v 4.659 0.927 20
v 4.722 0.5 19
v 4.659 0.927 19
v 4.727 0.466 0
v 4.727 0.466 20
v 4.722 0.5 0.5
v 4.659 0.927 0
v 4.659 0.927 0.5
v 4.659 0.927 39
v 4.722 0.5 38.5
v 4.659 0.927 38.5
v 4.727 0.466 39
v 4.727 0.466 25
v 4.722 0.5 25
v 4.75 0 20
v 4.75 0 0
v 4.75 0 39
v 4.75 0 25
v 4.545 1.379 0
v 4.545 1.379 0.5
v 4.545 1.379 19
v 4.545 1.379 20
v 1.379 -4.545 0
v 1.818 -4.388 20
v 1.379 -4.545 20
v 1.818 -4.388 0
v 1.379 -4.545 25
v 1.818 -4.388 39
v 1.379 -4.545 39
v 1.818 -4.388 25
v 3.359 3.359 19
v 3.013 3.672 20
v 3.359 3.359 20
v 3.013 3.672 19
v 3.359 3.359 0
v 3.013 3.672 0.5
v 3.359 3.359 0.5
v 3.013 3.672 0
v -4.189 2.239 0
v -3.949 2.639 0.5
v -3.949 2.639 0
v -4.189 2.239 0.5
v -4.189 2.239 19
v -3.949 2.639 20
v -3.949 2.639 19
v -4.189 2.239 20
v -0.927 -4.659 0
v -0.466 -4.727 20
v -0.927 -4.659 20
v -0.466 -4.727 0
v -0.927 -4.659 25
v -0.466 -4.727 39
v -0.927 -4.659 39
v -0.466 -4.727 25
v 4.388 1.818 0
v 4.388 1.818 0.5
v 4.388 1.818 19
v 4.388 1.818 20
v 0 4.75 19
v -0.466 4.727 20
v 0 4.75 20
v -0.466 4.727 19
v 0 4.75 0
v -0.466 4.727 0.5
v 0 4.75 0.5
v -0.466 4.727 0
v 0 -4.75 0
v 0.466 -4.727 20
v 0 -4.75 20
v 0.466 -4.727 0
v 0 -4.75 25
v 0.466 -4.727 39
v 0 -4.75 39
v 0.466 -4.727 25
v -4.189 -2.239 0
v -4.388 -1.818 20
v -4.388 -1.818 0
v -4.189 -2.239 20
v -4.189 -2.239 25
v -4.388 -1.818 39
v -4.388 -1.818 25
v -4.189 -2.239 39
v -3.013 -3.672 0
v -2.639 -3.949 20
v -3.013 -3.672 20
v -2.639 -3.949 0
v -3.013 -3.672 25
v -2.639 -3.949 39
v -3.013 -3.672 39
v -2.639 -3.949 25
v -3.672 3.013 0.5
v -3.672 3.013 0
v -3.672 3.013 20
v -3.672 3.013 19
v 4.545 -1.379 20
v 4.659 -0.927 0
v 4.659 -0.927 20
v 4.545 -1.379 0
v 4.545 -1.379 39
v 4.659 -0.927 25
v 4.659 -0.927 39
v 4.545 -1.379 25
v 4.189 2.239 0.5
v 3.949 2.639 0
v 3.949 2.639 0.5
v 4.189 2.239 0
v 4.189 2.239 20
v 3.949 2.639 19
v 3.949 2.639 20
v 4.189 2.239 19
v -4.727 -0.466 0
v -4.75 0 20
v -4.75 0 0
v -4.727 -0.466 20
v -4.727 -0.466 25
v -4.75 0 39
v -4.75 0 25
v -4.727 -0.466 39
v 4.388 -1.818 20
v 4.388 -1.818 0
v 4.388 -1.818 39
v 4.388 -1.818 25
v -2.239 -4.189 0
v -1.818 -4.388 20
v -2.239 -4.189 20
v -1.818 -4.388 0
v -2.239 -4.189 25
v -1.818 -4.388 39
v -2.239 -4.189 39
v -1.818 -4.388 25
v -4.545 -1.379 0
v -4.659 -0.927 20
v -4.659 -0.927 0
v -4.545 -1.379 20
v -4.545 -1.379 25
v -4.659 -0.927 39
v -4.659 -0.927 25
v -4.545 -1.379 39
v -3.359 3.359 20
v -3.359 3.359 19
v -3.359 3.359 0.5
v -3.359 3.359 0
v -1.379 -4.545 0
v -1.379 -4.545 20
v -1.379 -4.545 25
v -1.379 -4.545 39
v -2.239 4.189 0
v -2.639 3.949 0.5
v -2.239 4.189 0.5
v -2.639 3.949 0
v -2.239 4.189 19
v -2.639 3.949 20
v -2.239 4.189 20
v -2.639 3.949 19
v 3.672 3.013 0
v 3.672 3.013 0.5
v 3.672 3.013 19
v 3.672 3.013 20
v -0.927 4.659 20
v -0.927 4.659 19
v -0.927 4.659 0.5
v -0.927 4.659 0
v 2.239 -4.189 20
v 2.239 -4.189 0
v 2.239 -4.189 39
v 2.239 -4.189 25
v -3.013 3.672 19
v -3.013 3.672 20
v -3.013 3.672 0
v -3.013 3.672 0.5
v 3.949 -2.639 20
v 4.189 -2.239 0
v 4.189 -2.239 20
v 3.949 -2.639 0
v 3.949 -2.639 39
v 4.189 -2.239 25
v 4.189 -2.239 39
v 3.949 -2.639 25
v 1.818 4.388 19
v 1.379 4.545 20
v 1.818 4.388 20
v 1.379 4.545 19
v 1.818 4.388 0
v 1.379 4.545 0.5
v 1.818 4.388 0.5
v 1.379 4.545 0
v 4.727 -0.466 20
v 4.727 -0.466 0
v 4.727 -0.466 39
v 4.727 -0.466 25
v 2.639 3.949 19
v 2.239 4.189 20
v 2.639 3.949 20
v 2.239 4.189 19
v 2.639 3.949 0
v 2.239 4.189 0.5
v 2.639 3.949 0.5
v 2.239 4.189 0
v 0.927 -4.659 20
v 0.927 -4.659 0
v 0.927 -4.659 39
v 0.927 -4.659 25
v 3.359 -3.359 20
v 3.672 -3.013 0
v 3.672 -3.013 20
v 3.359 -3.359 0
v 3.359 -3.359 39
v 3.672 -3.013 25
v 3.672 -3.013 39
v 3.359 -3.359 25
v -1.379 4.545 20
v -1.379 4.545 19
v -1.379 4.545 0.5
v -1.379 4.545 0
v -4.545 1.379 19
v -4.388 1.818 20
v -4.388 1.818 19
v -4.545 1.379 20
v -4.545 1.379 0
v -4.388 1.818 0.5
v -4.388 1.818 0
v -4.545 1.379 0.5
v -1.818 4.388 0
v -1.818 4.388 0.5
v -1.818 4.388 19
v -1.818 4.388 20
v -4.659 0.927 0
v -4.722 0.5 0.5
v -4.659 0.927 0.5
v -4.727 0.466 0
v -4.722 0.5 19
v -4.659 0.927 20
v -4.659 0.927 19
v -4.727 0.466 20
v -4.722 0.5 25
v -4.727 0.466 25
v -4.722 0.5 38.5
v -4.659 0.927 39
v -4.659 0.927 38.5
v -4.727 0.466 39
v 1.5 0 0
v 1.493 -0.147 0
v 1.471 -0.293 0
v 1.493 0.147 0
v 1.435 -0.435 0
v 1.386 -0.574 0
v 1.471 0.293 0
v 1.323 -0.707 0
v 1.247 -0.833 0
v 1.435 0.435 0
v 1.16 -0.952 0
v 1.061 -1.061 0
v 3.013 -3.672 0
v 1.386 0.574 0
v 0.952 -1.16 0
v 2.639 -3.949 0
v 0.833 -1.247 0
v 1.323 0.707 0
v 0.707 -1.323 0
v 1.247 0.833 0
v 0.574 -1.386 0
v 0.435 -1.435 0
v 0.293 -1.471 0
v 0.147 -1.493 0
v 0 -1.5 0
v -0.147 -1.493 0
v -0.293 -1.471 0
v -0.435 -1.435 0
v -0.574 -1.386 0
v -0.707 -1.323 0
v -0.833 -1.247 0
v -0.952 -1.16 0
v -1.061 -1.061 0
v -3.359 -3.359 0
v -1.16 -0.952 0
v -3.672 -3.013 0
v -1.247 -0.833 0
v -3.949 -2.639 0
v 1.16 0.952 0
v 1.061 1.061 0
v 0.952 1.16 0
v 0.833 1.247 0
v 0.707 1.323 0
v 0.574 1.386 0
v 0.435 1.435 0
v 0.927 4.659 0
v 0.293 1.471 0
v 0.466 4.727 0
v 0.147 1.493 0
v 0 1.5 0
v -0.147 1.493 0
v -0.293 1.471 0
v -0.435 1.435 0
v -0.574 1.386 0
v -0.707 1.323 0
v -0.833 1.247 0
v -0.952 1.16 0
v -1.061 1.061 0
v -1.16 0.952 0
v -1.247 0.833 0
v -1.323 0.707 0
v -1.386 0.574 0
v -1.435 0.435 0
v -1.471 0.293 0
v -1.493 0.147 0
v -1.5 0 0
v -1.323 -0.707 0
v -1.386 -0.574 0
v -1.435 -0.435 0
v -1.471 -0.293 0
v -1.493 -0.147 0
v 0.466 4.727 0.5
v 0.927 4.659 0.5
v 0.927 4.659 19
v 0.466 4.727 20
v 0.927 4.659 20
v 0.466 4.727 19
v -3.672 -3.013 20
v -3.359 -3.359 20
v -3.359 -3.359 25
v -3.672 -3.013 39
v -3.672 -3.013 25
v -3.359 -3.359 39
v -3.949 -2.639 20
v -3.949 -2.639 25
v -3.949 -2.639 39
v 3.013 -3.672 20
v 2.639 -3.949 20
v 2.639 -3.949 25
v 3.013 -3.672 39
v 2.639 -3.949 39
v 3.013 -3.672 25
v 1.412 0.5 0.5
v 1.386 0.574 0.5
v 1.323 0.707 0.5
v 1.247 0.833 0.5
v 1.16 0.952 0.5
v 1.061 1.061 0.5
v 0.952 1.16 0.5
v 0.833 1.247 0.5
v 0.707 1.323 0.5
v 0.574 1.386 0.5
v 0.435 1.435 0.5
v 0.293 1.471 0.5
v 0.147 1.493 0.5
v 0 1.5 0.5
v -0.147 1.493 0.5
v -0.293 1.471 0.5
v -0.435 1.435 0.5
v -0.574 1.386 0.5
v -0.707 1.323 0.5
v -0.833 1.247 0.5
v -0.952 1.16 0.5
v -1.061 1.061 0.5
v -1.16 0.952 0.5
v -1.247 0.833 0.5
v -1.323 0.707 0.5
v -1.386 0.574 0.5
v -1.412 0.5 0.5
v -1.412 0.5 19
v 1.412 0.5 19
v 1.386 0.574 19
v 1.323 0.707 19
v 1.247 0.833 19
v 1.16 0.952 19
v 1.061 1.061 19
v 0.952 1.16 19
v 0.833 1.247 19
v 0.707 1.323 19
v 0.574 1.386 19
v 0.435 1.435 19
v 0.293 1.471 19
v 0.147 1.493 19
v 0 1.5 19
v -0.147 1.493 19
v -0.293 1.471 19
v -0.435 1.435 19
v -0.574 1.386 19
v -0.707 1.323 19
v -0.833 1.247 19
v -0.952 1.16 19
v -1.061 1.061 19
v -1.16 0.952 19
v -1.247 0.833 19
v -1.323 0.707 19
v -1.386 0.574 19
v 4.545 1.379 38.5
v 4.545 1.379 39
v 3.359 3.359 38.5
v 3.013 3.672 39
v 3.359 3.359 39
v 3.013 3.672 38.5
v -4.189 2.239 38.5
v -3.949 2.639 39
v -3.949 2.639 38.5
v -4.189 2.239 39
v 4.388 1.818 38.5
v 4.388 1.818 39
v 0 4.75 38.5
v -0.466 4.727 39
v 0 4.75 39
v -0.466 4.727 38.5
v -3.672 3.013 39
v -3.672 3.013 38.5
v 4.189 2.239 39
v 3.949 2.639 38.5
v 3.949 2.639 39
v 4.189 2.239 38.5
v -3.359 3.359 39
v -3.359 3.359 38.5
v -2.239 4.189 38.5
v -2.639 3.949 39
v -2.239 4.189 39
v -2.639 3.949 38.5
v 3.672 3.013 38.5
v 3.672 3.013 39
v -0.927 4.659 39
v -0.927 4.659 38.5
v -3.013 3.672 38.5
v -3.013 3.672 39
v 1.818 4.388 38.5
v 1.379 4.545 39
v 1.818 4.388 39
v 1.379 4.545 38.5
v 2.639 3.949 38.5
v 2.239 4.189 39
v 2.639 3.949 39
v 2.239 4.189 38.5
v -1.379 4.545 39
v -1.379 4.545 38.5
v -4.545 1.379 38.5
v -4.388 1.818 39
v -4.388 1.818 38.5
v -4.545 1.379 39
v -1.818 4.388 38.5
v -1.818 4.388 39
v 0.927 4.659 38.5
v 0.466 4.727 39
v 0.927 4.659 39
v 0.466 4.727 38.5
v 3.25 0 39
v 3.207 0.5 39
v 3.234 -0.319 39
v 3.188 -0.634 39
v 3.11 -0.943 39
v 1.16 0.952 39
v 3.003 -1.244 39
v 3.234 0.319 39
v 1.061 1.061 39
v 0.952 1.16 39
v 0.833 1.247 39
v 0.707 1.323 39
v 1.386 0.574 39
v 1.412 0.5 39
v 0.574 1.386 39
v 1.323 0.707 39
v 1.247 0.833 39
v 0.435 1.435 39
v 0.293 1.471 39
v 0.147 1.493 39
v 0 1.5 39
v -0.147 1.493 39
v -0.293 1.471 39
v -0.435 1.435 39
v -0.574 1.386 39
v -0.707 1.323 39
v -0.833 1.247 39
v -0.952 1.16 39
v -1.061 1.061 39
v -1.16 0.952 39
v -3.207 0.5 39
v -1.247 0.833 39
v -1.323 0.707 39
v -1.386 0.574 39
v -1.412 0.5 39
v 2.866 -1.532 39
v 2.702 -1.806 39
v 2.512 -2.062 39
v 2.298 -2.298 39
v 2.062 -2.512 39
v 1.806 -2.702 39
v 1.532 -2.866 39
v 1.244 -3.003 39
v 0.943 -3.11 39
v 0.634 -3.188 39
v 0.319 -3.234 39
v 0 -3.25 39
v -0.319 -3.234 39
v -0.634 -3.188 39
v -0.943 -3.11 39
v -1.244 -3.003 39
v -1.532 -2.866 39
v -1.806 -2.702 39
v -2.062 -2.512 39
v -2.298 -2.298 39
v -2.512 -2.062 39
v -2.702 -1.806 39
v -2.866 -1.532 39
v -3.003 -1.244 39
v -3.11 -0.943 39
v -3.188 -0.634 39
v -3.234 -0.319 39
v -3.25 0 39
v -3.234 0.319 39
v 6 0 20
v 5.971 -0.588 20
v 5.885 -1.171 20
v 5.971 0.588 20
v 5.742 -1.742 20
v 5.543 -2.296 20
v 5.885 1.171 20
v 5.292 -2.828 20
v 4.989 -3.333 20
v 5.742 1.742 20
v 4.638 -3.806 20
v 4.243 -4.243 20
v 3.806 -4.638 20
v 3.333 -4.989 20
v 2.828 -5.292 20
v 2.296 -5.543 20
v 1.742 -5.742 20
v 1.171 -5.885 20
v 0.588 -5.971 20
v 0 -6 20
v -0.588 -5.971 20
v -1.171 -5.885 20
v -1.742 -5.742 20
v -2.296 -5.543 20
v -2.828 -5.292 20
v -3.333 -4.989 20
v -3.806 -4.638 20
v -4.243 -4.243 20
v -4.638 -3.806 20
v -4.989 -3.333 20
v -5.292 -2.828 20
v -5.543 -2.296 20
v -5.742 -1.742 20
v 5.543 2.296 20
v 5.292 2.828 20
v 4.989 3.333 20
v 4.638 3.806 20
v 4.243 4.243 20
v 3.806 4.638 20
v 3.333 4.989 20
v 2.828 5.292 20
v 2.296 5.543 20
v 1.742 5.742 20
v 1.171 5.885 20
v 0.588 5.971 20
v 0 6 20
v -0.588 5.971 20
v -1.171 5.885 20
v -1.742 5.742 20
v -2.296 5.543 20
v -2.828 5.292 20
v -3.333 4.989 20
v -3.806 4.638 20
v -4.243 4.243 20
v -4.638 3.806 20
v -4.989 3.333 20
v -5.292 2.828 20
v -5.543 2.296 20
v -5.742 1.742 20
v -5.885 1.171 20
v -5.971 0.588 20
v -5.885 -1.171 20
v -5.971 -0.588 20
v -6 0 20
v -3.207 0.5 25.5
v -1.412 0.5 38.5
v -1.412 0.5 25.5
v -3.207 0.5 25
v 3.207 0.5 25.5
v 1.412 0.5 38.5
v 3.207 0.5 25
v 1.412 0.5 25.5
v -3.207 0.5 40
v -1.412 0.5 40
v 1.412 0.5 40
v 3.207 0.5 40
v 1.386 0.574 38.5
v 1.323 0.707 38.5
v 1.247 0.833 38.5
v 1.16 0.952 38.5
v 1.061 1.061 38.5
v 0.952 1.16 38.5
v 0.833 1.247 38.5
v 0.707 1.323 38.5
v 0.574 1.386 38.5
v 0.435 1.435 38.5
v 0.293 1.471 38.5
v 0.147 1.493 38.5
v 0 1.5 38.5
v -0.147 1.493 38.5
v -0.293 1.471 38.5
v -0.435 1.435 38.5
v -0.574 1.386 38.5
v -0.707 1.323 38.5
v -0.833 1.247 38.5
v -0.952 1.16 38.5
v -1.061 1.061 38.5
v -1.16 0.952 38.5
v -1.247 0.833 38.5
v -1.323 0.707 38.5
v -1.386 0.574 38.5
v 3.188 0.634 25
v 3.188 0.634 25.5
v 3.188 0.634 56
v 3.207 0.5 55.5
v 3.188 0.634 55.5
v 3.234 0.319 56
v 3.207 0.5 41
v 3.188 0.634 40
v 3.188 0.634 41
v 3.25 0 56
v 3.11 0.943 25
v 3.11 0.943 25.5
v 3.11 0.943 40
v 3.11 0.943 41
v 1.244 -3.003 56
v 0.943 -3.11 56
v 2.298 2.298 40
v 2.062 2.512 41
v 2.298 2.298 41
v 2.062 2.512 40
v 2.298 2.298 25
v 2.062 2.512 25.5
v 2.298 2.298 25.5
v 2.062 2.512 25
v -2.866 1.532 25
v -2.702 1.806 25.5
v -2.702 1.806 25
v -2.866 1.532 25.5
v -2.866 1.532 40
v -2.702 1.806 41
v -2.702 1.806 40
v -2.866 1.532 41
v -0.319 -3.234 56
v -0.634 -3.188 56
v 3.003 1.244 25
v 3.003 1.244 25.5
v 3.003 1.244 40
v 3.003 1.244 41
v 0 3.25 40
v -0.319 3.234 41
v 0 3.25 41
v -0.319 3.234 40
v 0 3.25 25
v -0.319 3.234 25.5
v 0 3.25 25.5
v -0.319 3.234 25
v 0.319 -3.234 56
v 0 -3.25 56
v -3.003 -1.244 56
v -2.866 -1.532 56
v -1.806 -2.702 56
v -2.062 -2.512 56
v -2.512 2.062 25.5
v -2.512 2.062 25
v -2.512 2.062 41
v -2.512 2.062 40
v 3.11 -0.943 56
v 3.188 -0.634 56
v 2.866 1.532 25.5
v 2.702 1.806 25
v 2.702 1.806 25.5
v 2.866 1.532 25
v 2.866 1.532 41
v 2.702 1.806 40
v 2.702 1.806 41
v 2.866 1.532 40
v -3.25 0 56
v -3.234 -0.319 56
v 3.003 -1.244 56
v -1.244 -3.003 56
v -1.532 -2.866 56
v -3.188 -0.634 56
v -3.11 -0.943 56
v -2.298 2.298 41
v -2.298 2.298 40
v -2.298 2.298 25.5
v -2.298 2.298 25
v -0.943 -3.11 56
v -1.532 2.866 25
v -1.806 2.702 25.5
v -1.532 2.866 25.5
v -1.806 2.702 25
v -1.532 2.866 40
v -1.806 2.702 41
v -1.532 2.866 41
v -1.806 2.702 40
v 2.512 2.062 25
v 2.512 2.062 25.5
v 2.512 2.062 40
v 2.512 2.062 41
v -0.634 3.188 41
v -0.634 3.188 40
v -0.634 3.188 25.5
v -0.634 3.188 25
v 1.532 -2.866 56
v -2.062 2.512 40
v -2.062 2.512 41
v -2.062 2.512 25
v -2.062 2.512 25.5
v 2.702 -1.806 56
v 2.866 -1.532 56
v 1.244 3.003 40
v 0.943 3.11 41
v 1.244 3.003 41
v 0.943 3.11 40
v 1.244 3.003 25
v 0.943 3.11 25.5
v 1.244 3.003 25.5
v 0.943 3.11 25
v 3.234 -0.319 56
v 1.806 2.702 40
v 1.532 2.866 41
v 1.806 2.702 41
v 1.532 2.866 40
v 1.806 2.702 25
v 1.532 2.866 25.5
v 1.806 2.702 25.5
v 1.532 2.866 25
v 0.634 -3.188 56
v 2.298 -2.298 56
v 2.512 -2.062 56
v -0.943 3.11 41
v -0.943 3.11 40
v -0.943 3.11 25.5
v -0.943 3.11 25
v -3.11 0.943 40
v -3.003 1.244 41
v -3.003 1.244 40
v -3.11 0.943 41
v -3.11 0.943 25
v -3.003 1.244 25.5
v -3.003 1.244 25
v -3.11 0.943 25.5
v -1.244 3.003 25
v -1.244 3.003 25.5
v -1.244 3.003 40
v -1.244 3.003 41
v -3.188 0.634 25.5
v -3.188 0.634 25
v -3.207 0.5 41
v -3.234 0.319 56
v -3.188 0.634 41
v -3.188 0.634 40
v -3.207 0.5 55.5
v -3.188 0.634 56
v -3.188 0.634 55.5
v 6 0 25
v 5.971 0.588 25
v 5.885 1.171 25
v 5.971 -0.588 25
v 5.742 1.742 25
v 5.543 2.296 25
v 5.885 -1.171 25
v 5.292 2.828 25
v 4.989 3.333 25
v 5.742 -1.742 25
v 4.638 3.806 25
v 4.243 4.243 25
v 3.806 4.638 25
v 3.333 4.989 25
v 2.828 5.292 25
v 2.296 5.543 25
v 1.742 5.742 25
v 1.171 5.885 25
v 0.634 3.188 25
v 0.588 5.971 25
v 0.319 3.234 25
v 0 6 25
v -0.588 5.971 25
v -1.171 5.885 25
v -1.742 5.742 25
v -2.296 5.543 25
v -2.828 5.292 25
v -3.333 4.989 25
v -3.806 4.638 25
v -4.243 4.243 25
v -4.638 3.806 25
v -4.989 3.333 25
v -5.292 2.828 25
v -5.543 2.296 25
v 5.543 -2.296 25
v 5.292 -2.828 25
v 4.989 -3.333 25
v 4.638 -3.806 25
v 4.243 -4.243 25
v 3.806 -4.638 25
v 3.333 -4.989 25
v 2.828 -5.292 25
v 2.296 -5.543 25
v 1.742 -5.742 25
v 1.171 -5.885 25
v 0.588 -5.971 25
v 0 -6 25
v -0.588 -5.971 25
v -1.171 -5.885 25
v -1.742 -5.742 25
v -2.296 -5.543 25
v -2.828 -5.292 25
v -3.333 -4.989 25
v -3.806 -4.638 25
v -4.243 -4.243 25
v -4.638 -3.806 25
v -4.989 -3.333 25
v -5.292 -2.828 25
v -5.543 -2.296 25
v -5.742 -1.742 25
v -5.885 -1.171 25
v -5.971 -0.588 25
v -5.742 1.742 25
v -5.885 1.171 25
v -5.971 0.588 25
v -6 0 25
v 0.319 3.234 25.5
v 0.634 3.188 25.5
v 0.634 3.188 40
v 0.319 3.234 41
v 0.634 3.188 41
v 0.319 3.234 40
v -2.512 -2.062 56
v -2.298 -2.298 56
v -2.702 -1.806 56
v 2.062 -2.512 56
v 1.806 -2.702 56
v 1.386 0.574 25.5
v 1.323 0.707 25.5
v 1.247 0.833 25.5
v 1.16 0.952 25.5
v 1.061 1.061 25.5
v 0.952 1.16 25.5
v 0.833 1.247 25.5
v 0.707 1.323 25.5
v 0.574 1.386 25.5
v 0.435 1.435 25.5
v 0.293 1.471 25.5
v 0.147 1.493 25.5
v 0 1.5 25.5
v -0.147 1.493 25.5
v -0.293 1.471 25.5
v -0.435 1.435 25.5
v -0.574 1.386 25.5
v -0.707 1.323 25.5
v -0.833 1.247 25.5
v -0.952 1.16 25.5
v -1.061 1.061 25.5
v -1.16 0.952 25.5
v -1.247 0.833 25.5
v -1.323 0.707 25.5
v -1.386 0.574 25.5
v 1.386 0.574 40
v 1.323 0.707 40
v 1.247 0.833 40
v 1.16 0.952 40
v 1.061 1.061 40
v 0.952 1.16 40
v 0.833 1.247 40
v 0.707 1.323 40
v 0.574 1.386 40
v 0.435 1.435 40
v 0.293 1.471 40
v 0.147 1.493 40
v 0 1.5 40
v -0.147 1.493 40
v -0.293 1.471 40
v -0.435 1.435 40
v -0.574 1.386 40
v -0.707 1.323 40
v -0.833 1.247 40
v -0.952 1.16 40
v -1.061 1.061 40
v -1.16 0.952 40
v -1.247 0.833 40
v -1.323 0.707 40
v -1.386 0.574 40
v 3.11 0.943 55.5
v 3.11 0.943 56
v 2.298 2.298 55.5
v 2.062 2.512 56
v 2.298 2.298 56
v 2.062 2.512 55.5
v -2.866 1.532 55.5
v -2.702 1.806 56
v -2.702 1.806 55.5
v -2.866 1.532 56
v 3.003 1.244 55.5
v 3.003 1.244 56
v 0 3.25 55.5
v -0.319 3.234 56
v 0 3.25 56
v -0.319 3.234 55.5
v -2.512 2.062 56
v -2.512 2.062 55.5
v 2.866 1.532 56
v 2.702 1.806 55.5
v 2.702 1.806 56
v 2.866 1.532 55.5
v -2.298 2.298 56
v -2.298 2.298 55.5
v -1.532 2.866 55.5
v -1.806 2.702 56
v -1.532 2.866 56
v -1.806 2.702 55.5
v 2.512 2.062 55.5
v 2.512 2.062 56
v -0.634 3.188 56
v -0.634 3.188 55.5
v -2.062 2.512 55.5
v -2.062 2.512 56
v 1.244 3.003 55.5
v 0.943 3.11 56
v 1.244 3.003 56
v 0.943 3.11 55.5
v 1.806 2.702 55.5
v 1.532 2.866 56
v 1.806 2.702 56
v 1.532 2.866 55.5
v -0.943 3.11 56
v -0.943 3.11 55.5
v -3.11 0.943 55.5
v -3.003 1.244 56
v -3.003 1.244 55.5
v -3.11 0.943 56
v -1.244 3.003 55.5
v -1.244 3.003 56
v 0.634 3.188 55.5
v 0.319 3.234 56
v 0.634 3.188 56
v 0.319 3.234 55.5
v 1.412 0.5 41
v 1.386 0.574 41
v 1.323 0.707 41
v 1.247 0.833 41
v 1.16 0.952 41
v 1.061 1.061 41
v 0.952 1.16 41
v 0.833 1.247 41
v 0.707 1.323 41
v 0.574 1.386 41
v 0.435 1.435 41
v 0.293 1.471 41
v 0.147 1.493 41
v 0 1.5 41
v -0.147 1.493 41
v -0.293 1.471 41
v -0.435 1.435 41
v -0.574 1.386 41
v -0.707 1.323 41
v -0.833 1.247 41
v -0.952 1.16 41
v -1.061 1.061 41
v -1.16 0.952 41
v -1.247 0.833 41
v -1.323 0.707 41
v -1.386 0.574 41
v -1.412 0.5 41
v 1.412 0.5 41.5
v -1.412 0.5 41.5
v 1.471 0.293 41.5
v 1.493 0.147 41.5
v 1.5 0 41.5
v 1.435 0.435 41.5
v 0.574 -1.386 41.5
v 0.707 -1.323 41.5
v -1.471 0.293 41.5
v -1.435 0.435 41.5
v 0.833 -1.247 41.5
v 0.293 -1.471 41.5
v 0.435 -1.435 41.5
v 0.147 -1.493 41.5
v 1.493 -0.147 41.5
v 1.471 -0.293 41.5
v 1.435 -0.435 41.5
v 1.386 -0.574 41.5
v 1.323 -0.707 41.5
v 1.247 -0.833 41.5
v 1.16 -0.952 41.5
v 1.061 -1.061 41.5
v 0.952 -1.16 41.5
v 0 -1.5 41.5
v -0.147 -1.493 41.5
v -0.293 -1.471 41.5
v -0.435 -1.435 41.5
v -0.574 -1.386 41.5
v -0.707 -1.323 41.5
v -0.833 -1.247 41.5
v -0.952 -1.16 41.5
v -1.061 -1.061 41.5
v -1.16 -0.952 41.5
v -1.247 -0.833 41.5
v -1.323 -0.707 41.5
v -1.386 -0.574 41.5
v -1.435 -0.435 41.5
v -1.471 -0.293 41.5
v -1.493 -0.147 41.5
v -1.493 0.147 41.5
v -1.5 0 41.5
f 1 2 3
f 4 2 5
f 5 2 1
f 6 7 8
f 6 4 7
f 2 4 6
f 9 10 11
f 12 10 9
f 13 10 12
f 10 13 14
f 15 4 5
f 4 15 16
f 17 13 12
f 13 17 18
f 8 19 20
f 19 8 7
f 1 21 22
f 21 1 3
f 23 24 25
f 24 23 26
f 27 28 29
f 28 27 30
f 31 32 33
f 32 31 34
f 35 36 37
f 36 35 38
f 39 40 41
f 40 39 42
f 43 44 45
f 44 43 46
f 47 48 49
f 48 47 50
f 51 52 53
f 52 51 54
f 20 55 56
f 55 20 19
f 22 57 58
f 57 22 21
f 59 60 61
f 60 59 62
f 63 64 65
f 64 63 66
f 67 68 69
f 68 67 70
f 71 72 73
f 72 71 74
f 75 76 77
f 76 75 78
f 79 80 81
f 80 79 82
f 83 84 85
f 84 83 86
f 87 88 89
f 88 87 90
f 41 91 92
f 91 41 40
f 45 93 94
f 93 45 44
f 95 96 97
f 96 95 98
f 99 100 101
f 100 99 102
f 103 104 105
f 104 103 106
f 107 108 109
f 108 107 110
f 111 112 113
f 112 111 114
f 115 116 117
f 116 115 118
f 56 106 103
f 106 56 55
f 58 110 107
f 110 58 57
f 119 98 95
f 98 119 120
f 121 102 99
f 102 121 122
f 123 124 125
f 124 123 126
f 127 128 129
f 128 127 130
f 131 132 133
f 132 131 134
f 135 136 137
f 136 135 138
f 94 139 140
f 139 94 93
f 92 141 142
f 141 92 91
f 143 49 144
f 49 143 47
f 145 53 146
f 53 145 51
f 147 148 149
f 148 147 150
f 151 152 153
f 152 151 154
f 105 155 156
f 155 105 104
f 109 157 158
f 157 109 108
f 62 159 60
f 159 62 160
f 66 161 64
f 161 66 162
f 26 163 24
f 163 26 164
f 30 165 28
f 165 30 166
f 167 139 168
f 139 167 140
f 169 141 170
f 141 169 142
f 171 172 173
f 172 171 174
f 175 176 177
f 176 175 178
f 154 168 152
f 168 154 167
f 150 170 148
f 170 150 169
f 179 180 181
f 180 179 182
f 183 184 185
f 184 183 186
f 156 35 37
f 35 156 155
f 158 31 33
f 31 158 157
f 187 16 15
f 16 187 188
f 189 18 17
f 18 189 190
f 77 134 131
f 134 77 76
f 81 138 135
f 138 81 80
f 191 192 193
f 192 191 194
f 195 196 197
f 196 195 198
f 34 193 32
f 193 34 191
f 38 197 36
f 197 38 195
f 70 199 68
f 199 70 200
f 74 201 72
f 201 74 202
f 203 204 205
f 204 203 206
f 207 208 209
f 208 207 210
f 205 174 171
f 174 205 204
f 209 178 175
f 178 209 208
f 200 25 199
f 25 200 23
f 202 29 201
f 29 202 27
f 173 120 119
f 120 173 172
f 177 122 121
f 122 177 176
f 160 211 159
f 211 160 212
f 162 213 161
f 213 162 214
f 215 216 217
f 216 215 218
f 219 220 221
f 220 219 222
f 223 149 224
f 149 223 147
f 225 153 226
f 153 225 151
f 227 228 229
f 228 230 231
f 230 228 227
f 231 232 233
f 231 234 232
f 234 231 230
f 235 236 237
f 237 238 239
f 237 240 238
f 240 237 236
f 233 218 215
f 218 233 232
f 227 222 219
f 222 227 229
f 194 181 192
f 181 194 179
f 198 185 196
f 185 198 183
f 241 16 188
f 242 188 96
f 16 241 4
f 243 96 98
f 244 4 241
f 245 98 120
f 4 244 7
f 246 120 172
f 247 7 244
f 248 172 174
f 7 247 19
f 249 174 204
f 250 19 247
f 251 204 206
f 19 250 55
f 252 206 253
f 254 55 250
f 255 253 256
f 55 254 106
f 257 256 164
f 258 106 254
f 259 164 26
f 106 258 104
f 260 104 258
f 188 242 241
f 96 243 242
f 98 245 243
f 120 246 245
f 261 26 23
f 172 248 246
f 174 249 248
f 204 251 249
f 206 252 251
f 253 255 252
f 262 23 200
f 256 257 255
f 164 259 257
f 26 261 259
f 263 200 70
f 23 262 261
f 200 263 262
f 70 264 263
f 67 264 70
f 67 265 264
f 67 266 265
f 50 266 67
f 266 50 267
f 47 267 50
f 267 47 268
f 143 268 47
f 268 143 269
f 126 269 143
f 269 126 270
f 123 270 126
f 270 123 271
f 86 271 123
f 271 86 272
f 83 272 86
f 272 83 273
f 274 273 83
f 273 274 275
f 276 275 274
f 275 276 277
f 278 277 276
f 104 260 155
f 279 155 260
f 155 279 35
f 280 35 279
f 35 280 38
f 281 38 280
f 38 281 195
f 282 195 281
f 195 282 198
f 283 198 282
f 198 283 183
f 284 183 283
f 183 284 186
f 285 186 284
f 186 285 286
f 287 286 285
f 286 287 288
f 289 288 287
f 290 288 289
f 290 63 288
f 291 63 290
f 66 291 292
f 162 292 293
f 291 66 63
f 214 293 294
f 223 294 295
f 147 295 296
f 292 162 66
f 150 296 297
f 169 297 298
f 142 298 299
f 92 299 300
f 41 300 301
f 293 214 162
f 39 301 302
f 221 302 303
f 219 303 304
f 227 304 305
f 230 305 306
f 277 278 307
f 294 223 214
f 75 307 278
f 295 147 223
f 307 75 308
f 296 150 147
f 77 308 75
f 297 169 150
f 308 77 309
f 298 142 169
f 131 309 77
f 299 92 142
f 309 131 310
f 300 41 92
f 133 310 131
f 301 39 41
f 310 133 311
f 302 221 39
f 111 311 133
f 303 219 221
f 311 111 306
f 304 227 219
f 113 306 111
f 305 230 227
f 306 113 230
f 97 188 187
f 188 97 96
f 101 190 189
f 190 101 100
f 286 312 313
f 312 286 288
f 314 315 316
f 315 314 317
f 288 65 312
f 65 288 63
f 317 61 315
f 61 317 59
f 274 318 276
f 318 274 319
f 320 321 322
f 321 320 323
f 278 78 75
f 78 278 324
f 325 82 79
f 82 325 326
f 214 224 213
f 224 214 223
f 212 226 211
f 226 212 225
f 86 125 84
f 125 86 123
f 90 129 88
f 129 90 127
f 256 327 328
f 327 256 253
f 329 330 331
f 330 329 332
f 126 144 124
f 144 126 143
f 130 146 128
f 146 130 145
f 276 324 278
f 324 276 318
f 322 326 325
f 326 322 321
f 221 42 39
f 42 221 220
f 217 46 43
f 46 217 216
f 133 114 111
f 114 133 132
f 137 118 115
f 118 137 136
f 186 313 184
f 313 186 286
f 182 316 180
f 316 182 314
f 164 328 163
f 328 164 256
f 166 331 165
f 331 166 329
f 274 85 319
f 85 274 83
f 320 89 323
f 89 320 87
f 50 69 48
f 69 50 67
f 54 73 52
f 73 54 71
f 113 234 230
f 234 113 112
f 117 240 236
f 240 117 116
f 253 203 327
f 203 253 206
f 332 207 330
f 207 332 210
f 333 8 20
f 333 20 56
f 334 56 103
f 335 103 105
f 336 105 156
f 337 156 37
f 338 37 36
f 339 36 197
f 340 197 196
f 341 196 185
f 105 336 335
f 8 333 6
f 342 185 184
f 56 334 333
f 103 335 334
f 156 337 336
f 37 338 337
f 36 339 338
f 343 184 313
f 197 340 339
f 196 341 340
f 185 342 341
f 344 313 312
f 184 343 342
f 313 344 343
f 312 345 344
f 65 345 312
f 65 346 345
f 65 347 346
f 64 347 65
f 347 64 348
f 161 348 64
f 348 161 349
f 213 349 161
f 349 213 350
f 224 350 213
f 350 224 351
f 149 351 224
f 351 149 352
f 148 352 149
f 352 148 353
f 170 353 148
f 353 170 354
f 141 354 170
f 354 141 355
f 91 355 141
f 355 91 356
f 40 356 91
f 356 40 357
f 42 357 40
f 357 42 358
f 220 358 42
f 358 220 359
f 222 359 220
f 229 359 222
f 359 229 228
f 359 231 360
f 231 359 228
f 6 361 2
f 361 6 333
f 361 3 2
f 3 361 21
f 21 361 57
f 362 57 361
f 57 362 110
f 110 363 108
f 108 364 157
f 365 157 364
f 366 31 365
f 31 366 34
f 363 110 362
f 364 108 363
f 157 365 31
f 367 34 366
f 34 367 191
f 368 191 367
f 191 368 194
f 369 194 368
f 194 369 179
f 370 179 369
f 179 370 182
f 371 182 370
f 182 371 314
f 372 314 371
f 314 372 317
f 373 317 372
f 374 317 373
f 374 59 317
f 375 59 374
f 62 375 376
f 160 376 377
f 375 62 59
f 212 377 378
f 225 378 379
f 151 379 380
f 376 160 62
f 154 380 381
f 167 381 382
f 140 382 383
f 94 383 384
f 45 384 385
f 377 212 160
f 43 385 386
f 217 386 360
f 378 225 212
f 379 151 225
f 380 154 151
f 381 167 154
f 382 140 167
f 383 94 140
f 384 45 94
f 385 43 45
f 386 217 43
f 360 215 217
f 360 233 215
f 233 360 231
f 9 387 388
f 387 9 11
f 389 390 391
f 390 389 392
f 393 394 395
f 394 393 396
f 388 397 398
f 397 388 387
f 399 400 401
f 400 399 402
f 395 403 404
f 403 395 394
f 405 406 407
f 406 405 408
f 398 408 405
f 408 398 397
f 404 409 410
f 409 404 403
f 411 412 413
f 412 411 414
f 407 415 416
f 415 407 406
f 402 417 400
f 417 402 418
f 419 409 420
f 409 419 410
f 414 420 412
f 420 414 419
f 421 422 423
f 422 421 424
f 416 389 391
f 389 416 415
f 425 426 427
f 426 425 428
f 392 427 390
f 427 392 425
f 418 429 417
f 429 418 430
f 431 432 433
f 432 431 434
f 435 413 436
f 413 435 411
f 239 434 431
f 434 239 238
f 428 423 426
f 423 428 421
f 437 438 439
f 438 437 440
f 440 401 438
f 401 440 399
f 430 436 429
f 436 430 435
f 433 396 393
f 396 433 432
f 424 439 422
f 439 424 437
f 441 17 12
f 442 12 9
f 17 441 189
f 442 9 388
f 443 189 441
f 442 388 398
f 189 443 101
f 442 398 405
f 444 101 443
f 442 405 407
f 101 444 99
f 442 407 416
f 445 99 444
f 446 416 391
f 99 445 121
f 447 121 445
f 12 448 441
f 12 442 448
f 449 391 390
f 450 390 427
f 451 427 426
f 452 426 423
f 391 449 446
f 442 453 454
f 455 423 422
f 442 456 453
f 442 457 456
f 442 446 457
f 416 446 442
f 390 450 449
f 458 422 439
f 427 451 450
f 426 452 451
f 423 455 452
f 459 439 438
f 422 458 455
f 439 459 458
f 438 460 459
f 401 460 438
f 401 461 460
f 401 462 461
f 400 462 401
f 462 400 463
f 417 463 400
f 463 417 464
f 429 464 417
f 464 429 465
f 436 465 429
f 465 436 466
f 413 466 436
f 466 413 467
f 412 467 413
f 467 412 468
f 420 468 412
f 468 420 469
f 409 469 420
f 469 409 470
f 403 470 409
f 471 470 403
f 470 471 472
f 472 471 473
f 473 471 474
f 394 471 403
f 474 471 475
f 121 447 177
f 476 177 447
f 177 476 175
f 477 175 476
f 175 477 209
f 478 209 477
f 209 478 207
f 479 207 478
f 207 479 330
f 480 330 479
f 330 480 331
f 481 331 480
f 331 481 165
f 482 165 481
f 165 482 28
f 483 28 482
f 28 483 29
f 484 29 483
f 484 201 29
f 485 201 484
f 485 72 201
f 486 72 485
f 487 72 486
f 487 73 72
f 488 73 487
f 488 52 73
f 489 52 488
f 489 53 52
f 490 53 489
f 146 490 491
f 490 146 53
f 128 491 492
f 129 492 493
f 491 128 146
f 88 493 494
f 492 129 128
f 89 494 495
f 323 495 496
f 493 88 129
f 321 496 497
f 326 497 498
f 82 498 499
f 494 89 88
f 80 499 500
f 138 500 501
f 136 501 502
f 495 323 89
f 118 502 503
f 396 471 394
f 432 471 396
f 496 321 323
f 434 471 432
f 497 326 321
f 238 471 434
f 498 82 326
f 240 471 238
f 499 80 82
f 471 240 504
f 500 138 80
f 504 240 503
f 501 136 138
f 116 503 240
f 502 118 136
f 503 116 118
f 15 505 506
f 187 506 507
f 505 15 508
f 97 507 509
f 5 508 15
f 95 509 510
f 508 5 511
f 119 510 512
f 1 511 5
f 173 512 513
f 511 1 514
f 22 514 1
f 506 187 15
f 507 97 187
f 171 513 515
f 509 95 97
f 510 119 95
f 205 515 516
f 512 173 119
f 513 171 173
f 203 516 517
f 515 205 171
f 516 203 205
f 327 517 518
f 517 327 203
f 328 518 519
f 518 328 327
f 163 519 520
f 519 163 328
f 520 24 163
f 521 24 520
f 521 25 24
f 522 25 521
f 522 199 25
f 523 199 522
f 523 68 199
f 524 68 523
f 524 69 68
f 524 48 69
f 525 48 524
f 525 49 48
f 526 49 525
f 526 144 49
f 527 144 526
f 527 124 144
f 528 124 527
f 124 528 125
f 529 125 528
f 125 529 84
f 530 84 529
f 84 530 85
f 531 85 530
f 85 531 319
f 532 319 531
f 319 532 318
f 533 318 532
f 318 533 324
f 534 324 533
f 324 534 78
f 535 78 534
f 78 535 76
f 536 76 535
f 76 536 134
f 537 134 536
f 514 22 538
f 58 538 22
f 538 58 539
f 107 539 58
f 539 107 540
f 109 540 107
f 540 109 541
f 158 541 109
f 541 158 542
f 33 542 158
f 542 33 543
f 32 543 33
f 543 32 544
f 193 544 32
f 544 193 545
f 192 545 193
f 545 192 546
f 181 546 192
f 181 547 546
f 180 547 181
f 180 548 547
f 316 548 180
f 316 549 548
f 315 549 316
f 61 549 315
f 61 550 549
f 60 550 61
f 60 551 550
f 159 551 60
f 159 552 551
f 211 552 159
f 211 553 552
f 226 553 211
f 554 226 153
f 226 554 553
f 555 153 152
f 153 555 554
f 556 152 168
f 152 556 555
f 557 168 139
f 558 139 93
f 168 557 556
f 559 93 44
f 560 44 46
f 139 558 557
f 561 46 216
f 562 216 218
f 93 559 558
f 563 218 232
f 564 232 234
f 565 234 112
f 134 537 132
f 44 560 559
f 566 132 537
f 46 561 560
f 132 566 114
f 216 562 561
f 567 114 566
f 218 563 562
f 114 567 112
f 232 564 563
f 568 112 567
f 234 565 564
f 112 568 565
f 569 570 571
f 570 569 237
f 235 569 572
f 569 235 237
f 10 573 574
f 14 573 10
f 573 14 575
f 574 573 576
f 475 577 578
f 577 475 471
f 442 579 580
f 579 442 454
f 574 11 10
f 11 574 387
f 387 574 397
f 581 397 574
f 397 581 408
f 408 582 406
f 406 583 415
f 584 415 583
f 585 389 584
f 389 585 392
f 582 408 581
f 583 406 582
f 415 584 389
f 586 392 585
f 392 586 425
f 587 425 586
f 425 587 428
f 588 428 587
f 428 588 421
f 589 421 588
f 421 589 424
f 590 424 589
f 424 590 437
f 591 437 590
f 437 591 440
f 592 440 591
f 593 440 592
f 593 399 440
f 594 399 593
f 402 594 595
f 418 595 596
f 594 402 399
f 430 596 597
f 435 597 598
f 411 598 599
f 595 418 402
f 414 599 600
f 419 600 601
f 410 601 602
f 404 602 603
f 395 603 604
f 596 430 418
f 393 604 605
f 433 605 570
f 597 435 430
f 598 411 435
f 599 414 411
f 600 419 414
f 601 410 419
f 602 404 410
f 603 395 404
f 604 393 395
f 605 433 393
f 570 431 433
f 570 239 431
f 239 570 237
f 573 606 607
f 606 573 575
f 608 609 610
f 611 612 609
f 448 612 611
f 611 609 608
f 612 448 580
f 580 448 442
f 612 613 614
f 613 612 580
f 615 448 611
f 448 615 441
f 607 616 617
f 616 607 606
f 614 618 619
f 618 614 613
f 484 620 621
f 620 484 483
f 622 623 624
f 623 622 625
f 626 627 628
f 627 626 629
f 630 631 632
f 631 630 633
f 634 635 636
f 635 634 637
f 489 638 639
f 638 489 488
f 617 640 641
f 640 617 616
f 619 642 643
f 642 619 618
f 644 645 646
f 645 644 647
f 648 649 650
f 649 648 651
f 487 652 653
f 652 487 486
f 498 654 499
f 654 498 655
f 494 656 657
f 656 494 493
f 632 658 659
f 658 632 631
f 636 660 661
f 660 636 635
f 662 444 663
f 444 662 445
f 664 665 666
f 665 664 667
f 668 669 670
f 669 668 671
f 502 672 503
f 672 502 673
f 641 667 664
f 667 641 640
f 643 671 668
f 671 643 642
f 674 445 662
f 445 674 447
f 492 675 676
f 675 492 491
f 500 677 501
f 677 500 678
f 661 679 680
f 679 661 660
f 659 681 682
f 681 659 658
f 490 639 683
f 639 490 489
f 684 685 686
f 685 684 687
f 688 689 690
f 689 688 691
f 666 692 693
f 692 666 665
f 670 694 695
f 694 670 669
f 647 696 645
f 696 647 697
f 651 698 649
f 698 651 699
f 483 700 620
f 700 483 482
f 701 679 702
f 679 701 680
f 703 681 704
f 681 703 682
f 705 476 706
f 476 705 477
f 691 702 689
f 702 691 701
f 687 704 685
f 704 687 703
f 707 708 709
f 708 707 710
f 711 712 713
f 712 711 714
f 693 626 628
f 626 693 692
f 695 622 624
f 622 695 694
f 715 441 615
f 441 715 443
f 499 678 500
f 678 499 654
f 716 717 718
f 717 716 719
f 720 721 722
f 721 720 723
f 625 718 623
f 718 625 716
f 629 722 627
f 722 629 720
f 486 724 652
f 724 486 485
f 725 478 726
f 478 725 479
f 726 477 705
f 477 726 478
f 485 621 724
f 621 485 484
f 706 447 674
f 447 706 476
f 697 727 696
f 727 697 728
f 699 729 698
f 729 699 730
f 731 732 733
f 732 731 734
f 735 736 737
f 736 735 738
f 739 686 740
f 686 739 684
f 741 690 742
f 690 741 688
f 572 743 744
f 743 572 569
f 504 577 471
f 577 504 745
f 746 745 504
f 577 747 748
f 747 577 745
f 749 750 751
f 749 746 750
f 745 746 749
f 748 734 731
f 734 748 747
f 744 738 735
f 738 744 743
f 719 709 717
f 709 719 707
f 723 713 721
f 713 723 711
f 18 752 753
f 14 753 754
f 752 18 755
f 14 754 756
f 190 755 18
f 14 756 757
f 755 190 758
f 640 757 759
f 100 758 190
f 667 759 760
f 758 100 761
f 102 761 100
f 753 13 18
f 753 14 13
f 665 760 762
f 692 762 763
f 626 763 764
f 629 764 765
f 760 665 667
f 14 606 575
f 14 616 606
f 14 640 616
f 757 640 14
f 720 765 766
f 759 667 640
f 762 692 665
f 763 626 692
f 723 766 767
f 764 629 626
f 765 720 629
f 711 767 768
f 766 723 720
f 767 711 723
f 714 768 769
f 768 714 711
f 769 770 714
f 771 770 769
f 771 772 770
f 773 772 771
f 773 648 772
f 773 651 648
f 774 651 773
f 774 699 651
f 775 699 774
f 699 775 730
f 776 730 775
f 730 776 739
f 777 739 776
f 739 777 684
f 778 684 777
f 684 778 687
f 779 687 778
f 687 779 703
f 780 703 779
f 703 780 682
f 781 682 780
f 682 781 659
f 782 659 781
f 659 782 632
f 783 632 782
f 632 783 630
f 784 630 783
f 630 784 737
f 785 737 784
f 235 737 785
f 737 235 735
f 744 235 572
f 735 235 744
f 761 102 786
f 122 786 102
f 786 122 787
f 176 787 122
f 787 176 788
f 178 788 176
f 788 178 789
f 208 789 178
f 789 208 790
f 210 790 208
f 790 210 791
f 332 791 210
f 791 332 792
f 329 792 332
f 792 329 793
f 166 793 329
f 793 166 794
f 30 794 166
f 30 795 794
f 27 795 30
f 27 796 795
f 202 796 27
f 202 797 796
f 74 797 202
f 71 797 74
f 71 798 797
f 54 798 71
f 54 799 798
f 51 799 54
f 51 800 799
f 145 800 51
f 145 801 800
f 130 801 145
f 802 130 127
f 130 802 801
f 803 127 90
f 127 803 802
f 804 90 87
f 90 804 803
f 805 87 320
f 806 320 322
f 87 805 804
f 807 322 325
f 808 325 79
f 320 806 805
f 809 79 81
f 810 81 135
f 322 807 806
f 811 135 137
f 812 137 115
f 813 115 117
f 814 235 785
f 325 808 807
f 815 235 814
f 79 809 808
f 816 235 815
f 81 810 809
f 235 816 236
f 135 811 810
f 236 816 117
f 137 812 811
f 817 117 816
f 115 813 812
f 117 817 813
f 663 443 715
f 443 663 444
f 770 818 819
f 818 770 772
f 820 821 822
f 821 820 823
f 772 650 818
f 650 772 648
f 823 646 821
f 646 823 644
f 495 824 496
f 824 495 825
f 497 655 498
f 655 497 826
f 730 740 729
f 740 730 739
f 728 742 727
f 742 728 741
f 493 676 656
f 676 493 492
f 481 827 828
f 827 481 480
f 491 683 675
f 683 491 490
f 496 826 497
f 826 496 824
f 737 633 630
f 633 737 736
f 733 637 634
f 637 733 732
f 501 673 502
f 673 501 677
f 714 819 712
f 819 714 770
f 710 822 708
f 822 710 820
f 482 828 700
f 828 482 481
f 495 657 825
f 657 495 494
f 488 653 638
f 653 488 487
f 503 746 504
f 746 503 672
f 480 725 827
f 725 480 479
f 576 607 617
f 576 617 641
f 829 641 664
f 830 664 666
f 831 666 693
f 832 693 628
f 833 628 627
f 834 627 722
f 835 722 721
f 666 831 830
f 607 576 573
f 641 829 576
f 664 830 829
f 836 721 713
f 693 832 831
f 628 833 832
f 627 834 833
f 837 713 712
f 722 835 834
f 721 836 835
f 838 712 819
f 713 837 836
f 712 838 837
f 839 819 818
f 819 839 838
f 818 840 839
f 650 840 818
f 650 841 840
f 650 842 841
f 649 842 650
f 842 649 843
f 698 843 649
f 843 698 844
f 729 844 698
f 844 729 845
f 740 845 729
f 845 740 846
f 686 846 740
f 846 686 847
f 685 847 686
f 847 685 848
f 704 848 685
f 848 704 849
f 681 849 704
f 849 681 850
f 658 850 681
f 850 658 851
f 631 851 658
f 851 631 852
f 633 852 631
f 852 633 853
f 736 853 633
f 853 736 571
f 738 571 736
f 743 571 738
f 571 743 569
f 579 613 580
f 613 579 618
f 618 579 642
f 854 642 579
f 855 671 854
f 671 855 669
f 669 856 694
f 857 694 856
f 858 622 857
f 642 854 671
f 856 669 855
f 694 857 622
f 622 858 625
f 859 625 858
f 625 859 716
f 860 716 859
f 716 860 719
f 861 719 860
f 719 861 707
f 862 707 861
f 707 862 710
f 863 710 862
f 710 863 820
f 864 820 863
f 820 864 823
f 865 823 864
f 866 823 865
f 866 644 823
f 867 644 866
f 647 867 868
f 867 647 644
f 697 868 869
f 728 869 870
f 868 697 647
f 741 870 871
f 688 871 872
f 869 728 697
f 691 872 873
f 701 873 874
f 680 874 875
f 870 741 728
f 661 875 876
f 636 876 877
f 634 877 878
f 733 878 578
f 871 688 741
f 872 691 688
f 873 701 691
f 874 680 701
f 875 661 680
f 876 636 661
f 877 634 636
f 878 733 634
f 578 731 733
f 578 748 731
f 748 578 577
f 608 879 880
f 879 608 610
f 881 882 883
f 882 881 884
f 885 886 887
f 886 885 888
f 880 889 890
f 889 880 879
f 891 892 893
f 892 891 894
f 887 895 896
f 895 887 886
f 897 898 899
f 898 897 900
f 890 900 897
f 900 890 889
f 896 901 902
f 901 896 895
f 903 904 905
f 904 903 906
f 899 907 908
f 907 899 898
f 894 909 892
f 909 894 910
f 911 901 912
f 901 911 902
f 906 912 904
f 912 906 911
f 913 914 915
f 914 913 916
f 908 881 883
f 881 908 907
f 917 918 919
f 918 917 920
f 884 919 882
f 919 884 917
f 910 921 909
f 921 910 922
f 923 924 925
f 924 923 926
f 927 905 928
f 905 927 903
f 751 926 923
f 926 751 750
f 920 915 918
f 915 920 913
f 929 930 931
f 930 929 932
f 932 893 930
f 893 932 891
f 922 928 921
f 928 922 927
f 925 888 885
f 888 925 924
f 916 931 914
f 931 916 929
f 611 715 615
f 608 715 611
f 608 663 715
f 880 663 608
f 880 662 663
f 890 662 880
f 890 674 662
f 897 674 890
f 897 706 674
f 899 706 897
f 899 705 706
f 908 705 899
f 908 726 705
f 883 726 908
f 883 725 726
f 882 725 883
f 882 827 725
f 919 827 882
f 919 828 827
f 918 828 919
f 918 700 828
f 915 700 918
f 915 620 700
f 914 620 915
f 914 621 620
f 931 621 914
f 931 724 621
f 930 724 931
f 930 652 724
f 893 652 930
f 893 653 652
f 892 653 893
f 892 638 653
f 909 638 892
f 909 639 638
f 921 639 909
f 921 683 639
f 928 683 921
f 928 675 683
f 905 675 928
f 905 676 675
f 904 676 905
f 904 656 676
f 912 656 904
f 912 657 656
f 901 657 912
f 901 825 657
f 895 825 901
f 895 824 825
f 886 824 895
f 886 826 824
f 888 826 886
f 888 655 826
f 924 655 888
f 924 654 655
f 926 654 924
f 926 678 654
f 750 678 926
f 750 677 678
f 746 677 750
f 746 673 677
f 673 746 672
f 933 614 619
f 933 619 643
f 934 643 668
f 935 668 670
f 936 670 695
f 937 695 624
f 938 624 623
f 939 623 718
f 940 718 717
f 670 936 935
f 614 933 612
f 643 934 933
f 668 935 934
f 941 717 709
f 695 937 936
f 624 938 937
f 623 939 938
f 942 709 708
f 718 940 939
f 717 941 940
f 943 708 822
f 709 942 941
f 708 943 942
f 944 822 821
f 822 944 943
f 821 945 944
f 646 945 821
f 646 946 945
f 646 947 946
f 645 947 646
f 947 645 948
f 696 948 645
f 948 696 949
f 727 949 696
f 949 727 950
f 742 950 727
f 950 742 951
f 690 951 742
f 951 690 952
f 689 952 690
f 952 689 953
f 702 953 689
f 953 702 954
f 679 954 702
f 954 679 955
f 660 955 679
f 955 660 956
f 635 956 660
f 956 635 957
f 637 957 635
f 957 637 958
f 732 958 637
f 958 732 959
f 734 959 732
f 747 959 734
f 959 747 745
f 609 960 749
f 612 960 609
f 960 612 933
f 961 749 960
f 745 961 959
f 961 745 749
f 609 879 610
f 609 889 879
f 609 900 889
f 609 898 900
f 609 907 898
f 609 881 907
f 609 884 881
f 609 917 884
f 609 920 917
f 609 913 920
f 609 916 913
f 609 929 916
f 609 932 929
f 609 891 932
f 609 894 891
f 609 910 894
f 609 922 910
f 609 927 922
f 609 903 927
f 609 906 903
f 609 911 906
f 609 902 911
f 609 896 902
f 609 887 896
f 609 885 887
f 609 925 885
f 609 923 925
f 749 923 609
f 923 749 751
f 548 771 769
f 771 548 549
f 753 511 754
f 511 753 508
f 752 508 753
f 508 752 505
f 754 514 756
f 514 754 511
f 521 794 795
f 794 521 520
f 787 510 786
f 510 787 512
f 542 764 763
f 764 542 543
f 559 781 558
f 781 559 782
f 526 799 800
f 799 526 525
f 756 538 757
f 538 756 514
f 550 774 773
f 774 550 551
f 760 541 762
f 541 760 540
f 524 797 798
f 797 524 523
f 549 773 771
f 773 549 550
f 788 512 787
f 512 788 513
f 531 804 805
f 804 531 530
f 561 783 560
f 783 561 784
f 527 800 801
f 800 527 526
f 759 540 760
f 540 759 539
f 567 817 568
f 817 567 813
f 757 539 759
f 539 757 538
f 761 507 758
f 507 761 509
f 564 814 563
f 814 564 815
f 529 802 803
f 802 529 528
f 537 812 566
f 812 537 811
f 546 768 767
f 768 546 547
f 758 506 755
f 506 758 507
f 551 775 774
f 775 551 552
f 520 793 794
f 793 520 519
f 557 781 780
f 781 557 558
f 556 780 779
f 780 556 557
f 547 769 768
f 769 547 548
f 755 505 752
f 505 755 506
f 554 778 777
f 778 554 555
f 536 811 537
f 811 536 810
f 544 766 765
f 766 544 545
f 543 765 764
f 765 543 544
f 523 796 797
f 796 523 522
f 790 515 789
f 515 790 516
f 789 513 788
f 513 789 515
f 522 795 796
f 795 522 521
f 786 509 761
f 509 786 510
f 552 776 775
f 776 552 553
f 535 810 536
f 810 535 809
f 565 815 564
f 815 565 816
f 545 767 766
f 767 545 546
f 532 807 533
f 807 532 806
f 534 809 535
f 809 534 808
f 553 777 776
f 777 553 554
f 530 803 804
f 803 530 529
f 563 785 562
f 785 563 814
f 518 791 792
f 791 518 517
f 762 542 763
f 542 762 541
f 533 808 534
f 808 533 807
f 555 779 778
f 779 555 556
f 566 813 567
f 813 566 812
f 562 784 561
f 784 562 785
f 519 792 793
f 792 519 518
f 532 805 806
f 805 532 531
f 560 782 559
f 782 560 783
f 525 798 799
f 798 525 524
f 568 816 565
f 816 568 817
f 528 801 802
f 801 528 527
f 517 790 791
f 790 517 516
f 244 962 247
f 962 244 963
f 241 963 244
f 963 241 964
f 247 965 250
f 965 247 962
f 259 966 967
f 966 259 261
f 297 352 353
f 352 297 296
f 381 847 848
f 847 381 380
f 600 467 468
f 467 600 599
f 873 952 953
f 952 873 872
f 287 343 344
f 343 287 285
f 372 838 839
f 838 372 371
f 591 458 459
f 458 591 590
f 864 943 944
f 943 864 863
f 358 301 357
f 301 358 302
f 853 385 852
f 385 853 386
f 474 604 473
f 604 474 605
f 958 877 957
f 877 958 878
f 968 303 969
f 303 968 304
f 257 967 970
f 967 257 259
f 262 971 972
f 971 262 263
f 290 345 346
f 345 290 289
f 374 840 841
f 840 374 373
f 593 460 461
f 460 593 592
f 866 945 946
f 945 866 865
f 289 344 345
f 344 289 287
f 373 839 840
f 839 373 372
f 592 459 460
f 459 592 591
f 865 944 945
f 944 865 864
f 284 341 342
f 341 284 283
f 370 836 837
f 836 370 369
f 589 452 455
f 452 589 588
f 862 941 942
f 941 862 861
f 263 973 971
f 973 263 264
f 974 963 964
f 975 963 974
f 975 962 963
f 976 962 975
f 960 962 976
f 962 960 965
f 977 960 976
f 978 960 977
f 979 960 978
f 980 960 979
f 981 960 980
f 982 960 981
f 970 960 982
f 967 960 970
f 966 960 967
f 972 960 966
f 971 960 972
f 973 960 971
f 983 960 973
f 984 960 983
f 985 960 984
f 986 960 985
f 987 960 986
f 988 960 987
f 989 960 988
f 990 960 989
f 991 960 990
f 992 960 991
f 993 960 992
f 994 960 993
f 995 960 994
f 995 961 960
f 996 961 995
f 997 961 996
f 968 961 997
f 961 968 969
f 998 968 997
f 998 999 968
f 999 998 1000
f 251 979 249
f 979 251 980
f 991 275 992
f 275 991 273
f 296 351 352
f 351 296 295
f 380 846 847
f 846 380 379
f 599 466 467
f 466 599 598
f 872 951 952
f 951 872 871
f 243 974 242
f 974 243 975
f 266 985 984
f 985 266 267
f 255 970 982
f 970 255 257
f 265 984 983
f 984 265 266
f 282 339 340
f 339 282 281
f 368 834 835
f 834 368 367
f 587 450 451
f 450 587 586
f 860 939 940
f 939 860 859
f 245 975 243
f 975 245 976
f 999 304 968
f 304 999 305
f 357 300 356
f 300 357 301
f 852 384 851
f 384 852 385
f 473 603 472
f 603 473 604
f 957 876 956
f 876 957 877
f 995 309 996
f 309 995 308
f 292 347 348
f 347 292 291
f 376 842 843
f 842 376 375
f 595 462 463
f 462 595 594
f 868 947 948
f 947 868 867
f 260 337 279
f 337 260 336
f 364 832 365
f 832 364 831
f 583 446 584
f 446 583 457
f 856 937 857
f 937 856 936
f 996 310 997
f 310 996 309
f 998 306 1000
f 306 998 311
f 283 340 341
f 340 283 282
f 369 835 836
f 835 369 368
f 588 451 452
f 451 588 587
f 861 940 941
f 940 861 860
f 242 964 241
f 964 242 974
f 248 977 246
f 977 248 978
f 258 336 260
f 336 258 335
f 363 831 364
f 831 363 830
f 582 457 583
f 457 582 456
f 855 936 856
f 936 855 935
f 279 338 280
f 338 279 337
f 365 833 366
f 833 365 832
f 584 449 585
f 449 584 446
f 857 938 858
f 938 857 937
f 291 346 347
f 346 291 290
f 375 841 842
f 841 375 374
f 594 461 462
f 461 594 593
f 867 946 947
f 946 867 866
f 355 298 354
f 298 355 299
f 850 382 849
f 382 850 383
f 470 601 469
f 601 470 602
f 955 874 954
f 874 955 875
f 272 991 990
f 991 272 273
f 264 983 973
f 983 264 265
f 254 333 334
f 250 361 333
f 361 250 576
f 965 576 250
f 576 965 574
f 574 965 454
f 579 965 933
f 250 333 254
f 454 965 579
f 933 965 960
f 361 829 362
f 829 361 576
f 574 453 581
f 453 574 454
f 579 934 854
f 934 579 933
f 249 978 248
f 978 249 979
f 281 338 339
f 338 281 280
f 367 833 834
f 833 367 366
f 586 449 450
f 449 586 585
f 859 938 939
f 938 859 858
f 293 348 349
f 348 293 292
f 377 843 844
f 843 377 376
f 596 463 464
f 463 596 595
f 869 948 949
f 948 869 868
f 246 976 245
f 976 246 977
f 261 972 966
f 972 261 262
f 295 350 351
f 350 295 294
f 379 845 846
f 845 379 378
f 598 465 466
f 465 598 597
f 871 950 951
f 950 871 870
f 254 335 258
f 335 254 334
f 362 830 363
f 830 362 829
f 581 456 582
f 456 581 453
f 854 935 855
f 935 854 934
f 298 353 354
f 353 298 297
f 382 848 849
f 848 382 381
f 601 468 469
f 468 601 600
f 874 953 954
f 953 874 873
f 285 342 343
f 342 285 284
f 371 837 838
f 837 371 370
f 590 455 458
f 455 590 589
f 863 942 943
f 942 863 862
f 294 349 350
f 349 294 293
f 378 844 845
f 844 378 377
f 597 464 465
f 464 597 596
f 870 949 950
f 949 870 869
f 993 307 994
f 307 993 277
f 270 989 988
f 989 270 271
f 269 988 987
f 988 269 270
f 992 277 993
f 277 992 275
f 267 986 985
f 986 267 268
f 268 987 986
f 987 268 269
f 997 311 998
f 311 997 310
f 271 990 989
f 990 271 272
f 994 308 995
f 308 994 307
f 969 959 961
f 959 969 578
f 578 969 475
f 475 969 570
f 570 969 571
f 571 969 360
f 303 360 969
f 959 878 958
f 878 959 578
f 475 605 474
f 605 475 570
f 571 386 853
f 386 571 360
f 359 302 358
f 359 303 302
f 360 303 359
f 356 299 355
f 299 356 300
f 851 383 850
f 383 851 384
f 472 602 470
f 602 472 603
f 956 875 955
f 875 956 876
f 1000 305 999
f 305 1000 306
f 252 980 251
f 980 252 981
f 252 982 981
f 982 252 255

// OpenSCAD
// Hose-barb reducer: 8 mm tubing -> 5 mm tubing
// Print orientation: standing upright along +Z

$fn = 64;

// ---- Dimensions (mm) ----
tube8_id      = 8;    // inner diameter of 8 mm tubing
tube5_id      = 5;    // inner diameter of 5 mm tubing
bore          = 3;    // through-bore diameter

length8       = 20;   // 8 mm tubing section height (z = 0 to 20)
collar        = 5;    // collar height (z = 20 to 25)
length5       = 16;   // 5 mm tubing section height (z = 25 to 41)

odb8          = 9.5;  // outer diameter of 8 mm barbs (top of sawtooth)
od5           = 6.5;  // outer diameter of 5 mm barbs (bottom of sawtooth)

overlap       = 0.5;  // overlap between stacked barbs
eps           = 0.5;  // cutter overshoot

// ---- Model ----
difference() {
    union() {
        // 8 mm tubing section: two stacked barbs
        for (i = [0, 1])
            translate([0, 0, i * (length8 - overlap)])
                barb(odb8, length8 - overlap, eps);

        // Collar
        translate([0, 0, length8])
            cylinder(d = 12, h = collar);

        // 5 mm tubing section: two stacked barbs
        for (i = [0, 1])
            translate([0, 0, length8 + collar + i * (length5 - overlap)])
                barb(od5, length5 - overlap, eps);
    }

    // Through bore
    translate([0, 0, -eps])
        cylinder(d = bore, h = length8 + collar + length5 + 2 * eps);
}

// Barb profile: cylinder with a sawtooth outer surface
module barb(od, h, eps) {
    difference() {
        cylinder(d = od, h = h);

        // Sawtooth growth along +Z, then step back
        translate([0, 0, eps])
            linear_extrude(height = h - 2 * eps)
                polygon([
                    [-od / 2, eps],
                    [od / 2, eps],
                    [(od + 2 * eps) / 2, h - eps],
                    [-(od + 2 * eps) / 2, h - eps]
                ]);
    }
}
